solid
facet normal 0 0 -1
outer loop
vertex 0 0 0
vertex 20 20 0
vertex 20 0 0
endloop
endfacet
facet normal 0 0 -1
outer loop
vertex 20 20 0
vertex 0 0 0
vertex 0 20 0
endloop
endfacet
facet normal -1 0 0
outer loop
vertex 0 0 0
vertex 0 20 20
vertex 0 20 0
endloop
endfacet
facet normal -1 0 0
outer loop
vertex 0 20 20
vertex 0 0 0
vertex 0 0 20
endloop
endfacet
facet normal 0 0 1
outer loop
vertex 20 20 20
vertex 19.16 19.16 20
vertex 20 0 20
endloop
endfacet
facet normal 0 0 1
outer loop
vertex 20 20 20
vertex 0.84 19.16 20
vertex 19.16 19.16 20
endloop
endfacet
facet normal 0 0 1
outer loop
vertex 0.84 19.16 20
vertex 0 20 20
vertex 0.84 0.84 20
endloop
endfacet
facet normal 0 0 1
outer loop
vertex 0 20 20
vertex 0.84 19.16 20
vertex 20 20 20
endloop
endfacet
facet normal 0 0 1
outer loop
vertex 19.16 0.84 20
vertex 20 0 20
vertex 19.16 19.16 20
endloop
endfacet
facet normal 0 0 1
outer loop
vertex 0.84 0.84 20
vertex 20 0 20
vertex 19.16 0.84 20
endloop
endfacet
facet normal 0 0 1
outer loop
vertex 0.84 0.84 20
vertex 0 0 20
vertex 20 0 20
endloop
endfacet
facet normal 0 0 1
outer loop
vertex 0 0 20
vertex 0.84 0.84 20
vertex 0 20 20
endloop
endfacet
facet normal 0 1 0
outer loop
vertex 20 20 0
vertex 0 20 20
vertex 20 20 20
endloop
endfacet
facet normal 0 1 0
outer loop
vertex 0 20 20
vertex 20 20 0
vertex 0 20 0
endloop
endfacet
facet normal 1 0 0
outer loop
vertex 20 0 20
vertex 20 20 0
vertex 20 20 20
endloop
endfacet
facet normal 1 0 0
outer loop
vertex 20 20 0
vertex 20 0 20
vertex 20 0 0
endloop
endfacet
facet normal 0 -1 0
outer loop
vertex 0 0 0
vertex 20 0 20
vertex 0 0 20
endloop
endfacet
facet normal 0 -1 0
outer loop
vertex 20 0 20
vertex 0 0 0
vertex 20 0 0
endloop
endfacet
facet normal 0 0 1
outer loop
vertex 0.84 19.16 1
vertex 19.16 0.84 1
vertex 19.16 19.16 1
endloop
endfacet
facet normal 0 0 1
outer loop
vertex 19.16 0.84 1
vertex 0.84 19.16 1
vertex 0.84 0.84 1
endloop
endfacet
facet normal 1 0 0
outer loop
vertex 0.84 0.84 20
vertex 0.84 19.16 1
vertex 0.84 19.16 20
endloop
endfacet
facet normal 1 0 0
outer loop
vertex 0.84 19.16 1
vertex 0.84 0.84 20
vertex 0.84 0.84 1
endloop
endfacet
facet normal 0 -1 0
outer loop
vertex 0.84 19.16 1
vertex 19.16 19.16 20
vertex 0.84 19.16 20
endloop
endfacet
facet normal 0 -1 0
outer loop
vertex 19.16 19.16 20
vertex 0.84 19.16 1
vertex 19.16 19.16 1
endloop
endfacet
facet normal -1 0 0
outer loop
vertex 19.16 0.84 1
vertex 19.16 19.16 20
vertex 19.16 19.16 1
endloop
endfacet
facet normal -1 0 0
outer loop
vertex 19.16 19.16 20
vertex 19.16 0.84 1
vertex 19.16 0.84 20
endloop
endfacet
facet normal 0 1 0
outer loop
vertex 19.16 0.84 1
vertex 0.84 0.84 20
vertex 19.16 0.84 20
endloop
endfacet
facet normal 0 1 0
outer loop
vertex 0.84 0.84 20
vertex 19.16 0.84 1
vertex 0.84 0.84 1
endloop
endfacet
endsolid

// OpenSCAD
// ---------------------------------------------------------------
// flow_cube.scad  -  thin-wall open box for flow-ratio calibration
// Used in: Level 2 exercise L2-3
//
// Slice with: 2 walls (or 1 wall in "classic" mode), 0% infill,
// 0 top layers, and your normal layer height.  Measure the wall
// thickness at several points with calipers and compare it with the
// expected value (2 x line width).  Wall thickness that is thicker than
// expected = over-extrusion; thinner = under-extrusion.
// Units: millimeters.
// ---------------------------------------------------------------

size        = 20;     // outer edge length
height      = 20;     // outer height
wall        = 0.84;   // modeled wall thickness (2 x 0.42 mm line width)
bottom      = 1.0;    // solid floor so the walls are connected
corner_r    = 0;      // optional vertical corner radius (0 = sharp)
$fn         = 48;

module footprint(s) {
    if (corner_r > 0) {
        offset(r = corner_r) offset(delta = -corner_r) square(s);
    } else {
        square(s);
    }
}

difference() {
    linear_extrude(height) footprint(size);
    // open-top cavity
    translate([wall, wall, bottom])
        linear_extrude(height) footprint(size - 2 * wall);
}
